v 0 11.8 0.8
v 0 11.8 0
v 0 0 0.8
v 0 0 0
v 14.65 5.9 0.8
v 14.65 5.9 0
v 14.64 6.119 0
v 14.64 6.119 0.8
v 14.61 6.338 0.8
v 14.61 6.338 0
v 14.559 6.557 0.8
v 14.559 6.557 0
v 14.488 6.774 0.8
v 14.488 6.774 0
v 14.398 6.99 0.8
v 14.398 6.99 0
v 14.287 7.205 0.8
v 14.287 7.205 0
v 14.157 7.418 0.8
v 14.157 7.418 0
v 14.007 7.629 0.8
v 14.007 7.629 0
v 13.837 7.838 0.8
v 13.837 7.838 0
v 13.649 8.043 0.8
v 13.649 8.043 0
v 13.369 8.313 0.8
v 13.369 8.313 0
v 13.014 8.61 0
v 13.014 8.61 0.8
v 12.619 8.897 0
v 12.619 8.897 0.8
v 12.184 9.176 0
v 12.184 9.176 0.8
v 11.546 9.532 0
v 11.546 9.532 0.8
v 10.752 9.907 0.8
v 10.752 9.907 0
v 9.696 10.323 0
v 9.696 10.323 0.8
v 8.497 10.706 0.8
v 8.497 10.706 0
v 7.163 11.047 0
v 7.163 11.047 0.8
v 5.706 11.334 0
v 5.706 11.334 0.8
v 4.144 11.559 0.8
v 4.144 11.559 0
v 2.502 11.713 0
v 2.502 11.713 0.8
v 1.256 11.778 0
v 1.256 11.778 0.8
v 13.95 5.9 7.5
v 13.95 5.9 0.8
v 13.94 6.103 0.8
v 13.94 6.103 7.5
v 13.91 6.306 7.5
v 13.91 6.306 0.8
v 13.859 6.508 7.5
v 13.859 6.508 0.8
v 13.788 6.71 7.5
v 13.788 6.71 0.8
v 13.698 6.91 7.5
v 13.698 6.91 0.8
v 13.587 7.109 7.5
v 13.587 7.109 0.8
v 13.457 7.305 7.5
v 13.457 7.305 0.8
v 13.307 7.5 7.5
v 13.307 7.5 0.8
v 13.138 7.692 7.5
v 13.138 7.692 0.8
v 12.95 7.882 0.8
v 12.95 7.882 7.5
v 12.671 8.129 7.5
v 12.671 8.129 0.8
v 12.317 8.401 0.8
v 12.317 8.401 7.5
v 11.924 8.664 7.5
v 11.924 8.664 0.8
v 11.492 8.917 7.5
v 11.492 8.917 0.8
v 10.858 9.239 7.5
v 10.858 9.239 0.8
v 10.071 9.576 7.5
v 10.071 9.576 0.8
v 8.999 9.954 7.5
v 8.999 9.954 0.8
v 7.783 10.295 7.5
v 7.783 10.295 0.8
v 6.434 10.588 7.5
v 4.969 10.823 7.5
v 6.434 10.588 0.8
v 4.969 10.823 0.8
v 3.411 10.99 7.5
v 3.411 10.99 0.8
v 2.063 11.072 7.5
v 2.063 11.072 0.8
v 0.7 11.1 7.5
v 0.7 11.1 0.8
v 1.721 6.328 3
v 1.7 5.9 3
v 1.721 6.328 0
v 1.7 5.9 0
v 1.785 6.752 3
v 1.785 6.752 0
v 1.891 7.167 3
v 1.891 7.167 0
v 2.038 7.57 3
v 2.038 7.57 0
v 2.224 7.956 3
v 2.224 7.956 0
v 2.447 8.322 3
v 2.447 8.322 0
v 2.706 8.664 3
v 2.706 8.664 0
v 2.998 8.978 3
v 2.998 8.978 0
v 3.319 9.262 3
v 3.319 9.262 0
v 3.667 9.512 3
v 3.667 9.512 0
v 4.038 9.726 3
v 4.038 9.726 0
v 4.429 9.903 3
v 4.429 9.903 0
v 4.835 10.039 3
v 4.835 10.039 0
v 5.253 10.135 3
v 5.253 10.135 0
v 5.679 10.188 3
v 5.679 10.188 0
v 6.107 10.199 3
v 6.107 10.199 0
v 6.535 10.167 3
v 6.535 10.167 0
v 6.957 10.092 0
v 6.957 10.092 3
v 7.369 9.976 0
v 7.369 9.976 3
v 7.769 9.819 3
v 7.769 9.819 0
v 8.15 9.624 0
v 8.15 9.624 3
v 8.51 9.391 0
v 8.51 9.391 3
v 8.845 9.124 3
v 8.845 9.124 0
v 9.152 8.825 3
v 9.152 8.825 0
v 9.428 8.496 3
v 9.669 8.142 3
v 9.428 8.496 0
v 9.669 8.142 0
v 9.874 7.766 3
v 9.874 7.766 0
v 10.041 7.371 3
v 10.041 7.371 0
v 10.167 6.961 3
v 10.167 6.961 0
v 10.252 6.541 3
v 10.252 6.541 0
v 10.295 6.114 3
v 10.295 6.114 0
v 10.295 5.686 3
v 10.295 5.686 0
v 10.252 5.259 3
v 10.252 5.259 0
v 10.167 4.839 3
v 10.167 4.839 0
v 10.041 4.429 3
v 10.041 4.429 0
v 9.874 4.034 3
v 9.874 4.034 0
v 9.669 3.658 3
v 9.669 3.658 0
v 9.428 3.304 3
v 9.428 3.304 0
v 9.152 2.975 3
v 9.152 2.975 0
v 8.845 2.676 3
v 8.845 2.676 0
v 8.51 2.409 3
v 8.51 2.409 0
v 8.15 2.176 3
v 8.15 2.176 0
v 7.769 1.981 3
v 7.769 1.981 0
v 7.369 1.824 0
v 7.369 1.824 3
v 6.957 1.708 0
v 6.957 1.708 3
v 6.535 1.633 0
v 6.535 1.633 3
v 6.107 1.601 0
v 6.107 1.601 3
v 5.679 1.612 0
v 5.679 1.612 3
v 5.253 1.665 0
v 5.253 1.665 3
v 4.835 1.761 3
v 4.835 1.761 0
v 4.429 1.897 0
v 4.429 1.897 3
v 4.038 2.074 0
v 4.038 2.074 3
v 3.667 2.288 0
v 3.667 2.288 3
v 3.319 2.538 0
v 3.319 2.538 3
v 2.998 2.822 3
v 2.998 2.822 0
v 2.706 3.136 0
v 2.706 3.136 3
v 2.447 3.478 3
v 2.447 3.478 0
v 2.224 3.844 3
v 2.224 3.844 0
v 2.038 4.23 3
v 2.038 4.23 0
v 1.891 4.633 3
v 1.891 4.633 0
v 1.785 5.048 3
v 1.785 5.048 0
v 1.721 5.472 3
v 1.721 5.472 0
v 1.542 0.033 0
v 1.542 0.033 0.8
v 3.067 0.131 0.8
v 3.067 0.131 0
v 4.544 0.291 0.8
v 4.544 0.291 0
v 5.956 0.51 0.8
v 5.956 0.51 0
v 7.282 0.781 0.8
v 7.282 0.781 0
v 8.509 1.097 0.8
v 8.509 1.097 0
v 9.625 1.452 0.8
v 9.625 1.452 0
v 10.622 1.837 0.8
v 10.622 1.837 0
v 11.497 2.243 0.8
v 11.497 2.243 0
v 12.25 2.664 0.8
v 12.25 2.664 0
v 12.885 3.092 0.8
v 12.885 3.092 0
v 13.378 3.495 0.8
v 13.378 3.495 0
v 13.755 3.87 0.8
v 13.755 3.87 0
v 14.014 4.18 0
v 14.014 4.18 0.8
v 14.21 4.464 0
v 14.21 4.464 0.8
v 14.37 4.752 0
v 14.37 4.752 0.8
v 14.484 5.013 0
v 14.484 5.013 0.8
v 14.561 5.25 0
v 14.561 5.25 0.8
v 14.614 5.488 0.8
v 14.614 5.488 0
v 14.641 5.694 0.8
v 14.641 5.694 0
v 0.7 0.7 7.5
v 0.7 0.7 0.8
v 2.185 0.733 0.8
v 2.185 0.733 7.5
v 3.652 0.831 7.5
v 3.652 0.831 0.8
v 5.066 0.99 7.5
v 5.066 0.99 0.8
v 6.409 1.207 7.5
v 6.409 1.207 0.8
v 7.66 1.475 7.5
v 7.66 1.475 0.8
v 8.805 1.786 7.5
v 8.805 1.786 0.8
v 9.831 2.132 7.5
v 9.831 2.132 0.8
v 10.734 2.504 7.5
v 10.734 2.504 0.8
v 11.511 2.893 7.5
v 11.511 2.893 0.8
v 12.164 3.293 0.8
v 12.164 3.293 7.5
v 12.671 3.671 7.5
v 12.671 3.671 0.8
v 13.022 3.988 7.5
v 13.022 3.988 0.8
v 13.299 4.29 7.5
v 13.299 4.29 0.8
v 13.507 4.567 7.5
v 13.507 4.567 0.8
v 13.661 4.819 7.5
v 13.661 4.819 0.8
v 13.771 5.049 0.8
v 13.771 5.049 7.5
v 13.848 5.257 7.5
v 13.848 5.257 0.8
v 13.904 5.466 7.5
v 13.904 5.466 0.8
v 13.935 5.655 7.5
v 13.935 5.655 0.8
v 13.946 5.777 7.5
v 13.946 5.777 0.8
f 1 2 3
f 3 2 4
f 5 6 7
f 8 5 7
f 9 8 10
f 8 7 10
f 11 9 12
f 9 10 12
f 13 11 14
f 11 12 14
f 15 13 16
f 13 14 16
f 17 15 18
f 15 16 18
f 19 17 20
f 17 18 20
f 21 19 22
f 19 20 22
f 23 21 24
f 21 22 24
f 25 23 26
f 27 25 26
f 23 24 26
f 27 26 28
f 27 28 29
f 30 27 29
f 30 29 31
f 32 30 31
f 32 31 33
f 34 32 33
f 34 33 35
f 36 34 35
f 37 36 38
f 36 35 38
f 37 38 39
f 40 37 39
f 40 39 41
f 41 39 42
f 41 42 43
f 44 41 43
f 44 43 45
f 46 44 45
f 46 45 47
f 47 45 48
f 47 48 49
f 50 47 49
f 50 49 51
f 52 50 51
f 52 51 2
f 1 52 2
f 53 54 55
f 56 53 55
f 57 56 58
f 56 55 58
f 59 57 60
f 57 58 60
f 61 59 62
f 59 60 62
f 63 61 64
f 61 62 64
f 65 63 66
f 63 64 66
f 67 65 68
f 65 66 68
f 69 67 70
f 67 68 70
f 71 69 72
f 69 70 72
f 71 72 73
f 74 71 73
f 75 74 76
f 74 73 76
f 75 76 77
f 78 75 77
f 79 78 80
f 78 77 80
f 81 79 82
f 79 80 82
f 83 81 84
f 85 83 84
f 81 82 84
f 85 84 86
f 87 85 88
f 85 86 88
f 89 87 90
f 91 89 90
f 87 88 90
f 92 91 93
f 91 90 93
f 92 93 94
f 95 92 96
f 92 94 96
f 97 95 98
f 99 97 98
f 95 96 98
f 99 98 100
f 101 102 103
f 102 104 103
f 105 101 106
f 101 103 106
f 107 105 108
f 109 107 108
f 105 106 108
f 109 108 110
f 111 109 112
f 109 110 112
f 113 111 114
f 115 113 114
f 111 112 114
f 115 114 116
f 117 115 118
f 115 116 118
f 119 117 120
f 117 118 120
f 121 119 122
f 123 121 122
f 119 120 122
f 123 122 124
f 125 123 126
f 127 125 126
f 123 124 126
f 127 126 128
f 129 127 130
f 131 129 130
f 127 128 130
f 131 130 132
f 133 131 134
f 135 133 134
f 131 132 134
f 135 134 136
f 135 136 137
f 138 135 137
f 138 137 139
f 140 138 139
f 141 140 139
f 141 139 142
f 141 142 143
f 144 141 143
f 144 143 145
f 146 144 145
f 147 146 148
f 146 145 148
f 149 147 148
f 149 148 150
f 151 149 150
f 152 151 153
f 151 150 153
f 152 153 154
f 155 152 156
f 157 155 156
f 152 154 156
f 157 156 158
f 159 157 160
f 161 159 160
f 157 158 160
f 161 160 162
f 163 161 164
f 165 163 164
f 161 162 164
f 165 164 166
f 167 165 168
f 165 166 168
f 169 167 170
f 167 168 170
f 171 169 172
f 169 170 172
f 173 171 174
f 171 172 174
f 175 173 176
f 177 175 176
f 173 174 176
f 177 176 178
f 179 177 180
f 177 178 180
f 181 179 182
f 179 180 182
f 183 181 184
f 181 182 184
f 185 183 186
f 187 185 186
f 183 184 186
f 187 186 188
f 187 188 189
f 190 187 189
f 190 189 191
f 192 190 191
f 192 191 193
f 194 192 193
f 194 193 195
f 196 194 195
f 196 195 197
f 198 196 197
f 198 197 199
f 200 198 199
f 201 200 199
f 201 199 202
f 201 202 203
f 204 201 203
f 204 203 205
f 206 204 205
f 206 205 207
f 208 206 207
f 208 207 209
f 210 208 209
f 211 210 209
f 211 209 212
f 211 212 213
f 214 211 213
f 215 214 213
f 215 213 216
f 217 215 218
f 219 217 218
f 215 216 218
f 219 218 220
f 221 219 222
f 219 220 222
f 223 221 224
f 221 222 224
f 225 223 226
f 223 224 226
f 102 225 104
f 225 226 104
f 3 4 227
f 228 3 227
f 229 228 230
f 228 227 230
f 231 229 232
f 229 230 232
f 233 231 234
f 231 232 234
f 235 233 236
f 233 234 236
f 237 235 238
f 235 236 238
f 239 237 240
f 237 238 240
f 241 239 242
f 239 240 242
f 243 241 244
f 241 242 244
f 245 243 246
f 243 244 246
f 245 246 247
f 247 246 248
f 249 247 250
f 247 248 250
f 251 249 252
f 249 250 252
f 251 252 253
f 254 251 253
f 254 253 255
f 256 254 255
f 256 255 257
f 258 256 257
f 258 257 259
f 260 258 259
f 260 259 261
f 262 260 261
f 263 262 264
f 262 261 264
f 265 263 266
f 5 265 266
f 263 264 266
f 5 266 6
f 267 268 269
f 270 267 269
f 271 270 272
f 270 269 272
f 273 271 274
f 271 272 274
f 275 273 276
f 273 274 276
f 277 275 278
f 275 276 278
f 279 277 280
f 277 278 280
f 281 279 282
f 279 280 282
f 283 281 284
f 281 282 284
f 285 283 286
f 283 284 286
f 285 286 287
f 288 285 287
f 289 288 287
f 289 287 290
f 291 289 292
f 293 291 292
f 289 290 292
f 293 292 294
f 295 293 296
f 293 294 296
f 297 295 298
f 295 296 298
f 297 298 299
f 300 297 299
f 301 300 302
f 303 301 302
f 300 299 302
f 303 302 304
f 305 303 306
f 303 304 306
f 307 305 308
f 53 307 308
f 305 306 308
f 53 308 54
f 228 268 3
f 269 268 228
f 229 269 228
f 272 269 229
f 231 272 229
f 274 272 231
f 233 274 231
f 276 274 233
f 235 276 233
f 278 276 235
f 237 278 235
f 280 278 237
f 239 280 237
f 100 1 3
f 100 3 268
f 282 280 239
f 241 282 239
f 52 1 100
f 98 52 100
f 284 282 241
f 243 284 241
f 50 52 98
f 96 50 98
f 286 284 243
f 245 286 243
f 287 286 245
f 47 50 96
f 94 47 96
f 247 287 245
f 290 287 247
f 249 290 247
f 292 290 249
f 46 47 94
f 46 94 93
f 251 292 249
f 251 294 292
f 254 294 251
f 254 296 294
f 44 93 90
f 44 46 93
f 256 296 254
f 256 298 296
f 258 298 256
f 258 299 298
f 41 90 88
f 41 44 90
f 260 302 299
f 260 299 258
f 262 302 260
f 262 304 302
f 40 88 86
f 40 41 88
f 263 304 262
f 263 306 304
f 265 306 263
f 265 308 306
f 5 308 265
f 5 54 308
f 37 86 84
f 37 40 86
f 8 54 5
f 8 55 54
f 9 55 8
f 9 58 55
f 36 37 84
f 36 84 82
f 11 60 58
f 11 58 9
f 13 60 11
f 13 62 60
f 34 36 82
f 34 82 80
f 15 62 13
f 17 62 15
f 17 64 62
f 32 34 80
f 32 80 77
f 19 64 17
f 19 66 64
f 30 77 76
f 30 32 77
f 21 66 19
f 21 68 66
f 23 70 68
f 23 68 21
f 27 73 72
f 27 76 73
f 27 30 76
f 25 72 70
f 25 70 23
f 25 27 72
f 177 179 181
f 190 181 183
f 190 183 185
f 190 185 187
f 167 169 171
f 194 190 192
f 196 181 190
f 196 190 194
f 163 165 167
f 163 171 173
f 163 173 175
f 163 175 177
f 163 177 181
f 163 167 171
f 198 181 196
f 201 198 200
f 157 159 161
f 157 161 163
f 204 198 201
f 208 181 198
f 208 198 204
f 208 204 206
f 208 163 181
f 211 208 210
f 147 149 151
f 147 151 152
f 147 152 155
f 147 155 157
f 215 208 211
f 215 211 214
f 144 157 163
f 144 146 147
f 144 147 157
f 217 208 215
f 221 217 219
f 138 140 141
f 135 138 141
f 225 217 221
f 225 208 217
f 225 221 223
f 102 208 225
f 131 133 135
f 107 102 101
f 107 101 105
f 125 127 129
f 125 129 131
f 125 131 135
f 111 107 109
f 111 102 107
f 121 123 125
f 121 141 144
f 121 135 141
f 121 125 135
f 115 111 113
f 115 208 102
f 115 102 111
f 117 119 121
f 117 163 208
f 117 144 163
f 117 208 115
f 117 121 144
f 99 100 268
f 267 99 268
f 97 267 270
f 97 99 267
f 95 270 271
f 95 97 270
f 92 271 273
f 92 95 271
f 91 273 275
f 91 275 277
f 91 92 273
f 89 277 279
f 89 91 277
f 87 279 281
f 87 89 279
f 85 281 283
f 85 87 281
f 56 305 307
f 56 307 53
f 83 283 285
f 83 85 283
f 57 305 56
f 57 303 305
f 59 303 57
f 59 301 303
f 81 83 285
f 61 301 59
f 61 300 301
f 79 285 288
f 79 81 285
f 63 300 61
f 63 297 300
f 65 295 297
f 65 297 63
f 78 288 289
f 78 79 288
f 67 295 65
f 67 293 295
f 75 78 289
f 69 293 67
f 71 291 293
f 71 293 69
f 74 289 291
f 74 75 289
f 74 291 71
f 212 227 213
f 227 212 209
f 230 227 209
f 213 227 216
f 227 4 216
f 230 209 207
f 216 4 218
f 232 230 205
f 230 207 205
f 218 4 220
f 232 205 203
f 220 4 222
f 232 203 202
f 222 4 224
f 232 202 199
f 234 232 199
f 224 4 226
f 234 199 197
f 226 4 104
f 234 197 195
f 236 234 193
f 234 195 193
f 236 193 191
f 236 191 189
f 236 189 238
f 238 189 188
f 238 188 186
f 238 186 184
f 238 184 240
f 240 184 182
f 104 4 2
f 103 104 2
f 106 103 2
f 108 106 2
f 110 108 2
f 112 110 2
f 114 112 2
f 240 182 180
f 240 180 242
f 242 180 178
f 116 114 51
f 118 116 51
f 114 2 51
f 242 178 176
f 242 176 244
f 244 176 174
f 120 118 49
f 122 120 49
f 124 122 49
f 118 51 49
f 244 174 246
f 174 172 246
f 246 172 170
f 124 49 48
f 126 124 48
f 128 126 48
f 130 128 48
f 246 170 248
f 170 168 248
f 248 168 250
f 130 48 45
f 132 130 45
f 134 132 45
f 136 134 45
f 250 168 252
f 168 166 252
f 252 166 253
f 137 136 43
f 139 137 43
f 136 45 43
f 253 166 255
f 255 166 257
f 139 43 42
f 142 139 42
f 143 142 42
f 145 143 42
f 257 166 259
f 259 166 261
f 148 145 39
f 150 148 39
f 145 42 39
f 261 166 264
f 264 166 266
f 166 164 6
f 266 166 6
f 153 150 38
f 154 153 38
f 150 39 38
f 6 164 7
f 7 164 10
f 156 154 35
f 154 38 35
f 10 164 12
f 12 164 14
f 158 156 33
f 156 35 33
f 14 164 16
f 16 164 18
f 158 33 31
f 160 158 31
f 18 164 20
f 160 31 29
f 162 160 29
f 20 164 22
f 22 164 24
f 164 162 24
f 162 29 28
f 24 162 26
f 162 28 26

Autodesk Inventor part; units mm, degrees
ref_plane "Plan YZ" through (0, 0, 0) normal (1, 0, 0) x (0, 1, 0)
ref_plane "Plan XZ" through (0, 0, 0) normal (0, 1, 0) x (-1, 0, 0)
ref_plane "Plan XY" through (0, 0, 0) normal (0, 0, 1) x (1, 0, 0)
sketch "Esquisse1" plane through (0, 0, 0) normal (0, 0, 1) x (1, 0, 0)
  line L0 (0, 11.8) -> (0, 0)
  ellipse E0 centre (0, 5.9) end of major axis (14.65, 5.9) minor radius 5.9
  dimension "d13" = 14.65
  dimension "d1" = 11.8
extrude "Extrusion3" add sketch "Esquisse1" along normal blind 0.8 contours E0 L0 picked at (3.5971, 4.141)
sketch "Esquisse7" plane through (0, 0, 0.8) normal (0, 0, 1) x (1, 0, 0)
  ellipse E0 centre (0.7, 5.9) end of major axis (13.95, 5.9) minor radius 5.2
  line L0 (0.7, 11.1) -> (0.7, 0.7)
  line L1 (0, 11.8) -> (0, 0) projected
  line L2 (0.7, 11.7933) -> (0.7, 11.1) construction
  line L3 (0.7, 0.7) -> (0.7, 0.0067) construction
  ellipse E1 centre (0, 5.9) end of major axis (14.65, 5.9) minor radius 5.9 (0, 0) -> (0, 11.8) ccw projected
  dimension "d16" = 13.25
  dimension "d17" = 10.4
  dimension "d18" = 0.7
extrude "Extrusion4" add sketch "Esquisse7" along normal blind 6.7 contours E0 L0
sketch "Esquisse8" plane through (0, 0, 0) normal (0, 0, -1) x (-1, 0, 0)
  circle A0 centre (-6, 5.9) radius 4.3
  line L0 (0, 11.8) -> (0, 0) projected
  line L1 (2.2688, 5.9) -> (-1.7595, 5.9) construction
  line L2 (0, 0) -> (0, 5.9) construction
  line L3 (0, 5.9) -> (0, 11.8) construction
  line L4 (-0.7, 0.7) -> (-0.7, 11.1) construction
  dimension "d21" = 8.6
  dimension "d26" = 5.3
extrude "Extrusion5" cut sketch "Esquisse8" against normal blind 3
properties part number "P1704_019_button_triangle_cap" material "."
